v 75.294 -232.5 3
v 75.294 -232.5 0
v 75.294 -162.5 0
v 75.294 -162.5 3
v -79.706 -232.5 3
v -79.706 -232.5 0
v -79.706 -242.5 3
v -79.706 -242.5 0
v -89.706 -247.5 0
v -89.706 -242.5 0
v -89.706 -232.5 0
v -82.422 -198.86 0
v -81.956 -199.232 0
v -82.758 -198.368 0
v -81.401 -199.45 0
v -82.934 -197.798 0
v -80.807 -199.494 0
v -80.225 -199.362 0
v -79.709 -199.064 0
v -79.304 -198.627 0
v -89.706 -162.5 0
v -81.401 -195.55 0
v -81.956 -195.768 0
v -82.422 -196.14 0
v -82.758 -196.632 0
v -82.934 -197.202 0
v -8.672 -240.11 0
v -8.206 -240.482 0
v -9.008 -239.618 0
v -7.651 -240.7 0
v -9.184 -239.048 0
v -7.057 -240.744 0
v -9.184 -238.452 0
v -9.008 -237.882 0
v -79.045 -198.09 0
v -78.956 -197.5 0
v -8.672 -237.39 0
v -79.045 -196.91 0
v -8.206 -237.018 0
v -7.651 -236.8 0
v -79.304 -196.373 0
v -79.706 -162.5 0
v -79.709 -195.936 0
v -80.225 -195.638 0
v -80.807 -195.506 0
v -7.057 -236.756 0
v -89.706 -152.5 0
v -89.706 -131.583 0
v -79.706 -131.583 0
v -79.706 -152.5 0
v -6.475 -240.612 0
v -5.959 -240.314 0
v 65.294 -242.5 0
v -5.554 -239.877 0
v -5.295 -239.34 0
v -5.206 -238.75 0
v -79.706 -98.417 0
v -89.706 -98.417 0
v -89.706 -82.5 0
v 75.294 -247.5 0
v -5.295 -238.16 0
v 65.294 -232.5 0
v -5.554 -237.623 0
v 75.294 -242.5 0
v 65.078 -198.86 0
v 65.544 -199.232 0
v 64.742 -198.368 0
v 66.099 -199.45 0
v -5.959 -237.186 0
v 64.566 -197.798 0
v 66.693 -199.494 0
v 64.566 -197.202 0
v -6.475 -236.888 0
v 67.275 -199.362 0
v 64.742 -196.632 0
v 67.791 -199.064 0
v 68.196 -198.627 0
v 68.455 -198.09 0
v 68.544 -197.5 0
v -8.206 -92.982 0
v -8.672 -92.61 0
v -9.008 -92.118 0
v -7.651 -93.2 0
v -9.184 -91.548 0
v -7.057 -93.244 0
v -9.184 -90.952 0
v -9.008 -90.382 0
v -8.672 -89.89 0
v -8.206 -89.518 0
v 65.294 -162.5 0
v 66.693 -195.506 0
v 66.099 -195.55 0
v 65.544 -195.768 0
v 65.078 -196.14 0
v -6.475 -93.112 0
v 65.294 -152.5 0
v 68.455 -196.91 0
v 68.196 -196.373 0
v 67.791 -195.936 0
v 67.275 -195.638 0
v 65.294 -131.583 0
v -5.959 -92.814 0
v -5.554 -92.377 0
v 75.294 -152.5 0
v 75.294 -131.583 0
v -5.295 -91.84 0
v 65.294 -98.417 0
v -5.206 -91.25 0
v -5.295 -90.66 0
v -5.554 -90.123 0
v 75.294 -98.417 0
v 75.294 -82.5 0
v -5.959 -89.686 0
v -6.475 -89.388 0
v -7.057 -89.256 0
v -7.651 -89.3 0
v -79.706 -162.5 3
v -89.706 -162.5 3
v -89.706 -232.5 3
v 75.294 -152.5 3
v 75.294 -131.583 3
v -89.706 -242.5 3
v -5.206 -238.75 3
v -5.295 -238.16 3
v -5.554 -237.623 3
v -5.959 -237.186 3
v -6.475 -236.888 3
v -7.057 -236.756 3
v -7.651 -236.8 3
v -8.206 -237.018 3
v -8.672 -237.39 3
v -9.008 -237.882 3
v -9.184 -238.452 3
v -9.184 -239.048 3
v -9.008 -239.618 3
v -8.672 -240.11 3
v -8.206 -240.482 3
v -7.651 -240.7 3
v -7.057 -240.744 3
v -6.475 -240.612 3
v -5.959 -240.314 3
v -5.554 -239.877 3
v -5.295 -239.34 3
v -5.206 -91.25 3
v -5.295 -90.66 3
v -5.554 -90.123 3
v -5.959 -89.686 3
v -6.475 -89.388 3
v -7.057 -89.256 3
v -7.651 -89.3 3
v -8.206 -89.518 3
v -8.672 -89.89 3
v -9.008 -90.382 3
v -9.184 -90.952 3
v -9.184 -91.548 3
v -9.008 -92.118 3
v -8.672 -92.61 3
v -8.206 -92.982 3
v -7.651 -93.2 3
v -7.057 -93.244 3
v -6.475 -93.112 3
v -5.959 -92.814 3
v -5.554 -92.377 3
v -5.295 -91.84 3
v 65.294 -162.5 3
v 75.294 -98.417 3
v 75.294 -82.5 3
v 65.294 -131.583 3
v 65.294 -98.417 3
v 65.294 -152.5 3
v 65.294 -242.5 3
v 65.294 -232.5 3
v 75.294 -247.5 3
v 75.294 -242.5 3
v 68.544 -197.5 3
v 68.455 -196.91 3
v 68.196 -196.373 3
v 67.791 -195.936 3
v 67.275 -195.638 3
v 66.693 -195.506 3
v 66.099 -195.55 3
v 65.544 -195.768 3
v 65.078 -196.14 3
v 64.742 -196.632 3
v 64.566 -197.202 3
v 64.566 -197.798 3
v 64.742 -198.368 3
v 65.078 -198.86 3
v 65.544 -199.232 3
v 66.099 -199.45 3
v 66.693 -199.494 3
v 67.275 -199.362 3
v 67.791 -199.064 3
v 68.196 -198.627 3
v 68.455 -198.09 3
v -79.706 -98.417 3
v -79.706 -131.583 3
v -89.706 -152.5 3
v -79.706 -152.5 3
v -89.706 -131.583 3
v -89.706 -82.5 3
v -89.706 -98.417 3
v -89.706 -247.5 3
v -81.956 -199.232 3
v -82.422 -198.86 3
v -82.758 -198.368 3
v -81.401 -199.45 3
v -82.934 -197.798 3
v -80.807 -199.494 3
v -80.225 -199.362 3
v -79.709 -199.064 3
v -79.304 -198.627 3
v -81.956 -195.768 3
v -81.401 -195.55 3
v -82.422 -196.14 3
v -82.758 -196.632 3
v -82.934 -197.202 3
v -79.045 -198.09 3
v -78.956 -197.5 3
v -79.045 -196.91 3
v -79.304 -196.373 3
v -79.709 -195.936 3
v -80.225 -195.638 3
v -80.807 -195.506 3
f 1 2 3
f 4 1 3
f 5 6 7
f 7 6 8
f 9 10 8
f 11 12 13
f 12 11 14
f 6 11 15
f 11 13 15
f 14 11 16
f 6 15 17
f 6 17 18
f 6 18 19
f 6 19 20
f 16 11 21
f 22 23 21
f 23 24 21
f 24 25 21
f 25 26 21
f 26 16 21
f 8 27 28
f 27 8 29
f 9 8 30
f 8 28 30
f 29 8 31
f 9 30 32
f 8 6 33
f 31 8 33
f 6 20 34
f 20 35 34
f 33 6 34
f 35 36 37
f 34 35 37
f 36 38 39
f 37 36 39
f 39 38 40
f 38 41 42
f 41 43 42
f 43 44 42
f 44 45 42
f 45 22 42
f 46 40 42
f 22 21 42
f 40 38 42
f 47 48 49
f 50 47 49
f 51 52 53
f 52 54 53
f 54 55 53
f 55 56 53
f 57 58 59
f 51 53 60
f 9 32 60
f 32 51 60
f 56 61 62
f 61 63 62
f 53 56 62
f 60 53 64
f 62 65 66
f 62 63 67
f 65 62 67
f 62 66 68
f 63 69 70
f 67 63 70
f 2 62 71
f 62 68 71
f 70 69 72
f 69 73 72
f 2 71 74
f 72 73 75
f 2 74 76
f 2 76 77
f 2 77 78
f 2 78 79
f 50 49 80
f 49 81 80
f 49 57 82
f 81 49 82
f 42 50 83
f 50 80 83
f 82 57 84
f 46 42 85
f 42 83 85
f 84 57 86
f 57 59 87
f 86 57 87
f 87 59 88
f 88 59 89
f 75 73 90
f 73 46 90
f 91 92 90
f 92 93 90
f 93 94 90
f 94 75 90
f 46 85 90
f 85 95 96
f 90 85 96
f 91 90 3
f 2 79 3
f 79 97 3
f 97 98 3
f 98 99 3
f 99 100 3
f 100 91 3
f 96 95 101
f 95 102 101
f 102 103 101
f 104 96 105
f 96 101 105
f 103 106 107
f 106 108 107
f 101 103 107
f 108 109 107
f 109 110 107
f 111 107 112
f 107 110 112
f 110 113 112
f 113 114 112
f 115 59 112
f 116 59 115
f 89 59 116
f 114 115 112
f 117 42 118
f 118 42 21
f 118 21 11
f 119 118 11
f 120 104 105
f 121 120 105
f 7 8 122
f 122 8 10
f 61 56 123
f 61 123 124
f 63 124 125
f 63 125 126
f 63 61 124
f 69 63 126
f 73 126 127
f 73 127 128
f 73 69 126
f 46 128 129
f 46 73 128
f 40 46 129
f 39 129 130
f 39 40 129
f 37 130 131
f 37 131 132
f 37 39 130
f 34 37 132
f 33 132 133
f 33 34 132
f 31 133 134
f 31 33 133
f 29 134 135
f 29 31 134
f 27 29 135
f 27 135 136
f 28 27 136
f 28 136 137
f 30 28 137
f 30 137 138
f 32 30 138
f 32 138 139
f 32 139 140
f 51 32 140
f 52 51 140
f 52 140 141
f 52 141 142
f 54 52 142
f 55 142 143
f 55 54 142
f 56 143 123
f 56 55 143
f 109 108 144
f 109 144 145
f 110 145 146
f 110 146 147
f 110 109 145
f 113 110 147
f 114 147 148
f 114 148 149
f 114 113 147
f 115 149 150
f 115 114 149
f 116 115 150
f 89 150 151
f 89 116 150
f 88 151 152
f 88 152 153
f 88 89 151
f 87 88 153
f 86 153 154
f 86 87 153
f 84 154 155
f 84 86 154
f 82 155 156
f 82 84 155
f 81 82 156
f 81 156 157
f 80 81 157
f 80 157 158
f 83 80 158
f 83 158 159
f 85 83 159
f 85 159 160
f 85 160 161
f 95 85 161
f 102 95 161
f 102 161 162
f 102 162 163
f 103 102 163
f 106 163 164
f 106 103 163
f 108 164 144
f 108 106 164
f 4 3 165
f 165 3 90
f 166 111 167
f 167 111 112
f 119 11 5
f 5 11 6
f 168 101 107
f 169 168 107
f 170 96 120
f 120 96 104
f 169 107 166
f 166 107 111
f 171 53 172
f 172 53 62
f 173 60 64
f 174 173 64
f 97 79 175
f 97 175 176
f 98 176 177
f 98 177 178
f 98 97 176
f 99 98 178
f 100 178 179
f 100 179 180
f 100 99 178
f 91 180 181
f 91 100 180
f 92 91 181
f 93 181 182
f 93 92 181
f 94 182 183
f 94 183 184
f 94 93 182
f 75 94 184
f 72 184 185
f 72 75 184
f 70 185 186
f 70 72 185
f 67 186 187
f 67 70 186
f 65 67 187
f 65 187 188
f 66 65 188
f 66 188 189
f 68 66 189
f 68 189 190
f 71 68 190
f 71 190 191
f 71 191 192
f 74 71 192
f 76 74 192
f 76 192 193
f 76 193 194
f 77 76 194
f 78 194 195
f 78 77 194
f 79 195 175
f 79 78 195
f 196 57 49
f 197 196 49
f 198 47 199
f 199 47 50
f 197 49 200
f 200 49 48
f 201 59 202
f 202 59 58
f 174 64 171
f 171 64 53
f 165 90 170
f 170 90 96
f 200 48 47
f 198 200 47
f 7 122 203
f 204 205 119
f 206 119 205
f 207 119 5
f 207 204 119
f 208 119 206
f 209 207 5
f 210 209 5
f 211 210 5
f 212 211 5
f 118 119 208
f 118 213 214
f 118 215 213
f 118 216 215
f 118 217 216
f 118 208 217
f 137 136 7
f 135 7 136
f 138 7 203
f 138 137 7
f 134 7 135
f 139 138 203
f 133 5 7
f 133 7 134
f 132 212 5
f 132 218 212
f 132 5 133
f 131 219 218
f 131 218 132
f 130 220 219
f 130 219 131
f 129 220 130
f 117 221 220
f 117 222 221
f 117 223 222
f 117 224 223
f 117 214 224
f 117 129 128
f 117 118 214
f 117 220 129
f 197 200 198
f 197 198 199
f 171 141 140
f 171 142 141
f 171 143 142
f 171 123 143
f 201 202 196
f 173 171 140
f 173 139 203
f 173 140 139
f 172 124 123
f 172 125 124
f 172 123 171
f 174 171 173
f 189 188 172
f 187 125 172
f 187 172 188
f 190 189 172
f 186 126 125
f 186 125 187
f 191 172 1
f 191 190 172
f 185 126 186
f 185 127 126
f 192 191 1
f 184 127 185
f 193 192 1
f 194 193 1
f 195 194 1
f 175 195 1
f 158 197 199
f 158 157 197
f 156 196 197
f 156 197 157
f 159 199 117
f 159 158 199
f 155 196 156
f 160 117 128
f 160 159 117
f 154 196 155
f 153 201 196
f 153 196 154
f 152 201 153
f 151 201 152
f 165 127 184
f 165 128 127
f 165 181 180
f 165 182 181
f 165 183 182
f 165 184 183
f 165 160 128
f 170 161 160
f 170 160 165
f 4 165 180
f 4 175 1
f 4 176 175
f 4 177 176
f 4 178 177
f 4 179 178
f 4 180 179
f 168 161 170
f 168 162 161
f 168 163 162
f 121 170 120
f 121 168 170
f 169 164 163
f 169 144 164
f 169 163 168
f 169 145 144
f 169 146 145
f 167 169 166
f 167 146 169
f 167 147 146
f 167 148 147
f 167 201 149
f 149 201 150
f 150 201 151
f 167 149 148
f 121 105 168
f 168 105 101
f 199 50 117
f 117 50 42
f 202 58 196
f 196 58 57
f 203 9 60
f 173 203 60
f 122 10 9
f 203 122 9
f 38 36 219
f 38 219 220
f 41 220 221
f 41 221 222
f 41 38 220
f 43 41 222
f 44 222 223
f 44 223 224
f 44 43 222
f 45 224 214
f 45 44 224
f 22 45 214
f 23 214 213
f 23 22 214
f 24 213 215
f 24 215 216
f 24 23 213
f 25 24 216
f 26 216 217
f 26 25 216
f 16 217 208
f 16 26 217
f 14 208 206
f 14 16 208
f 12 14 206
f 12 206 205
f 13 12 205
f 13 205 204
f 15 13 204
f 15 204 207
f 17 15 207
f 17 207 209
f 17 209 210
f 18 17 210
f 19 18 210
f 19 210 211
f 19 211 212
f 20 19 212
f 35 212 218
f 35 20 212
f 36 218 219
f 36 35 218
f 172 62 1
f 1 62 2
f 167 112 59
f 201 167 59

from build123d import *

# Parameters (mm, degrees)
ESQUISSE1_R        = 2
BOSS_EXTRU_1_DEPTH = 3


with BuildPart() as part:
    # Esquisse1 → Boss.-Extru.1 (new body)
    with BuildSketch(Plane.XY):
        Polygon((-89.706165703, -247.5), (75.293834297, -247.5), (75.293834297, -242.5), (65.293834297, -242.5), (65.293834297, -232.5), (75.293834297, -232.5), (75.293834297, -162.5), (65.293834297, -162.5), (65.293834297, -152.5), (75.293834297, -152.5), (75.293834297, -131.583123952), (65.293834297, -131.583123952), (65.293834297, -98.416876048), (75.293834297, -98.416876048), (75.293834297, -82.5), (-89.706165703, -82.5), (-89.706165703, -98.416876048), (-79.706165703, -98.416876048), (-79.706165703, -131.583123952), (-89.706165703, -131.583123952), (-89.706165703, -152.5), (-79.706165703, -152.5), (-79.706165703, -162.5), (-89.706165703, -162.5), (-89.706165703, -232.5), (-79.706165703, -232.5), (-79.706165703, -242.5), (-89.706165703, -242.5), align=None)
        with Locations((-7.206165703, -91.25)):
            Circle(ESQUISSE1_R, mode=Mode.SUBTRACT)
        with Locations((-80.956165703, -197.5)):
            Circle(ESQUISSE1_R, mode=Mode.SUBTRACT)
        with Locations((-7.206165703, -238.75)):
            Circle(ESQUISSE1_R, mode=Mode.SUBTRACT)
        with Locations((66.543834297, -197.5)):
            Circle(ESQUISSE1_R, mode=Mode.SUBTRACT)
    extrude(amount=BOSS_EXTRU_1_DEPTH)


solid = part.part
